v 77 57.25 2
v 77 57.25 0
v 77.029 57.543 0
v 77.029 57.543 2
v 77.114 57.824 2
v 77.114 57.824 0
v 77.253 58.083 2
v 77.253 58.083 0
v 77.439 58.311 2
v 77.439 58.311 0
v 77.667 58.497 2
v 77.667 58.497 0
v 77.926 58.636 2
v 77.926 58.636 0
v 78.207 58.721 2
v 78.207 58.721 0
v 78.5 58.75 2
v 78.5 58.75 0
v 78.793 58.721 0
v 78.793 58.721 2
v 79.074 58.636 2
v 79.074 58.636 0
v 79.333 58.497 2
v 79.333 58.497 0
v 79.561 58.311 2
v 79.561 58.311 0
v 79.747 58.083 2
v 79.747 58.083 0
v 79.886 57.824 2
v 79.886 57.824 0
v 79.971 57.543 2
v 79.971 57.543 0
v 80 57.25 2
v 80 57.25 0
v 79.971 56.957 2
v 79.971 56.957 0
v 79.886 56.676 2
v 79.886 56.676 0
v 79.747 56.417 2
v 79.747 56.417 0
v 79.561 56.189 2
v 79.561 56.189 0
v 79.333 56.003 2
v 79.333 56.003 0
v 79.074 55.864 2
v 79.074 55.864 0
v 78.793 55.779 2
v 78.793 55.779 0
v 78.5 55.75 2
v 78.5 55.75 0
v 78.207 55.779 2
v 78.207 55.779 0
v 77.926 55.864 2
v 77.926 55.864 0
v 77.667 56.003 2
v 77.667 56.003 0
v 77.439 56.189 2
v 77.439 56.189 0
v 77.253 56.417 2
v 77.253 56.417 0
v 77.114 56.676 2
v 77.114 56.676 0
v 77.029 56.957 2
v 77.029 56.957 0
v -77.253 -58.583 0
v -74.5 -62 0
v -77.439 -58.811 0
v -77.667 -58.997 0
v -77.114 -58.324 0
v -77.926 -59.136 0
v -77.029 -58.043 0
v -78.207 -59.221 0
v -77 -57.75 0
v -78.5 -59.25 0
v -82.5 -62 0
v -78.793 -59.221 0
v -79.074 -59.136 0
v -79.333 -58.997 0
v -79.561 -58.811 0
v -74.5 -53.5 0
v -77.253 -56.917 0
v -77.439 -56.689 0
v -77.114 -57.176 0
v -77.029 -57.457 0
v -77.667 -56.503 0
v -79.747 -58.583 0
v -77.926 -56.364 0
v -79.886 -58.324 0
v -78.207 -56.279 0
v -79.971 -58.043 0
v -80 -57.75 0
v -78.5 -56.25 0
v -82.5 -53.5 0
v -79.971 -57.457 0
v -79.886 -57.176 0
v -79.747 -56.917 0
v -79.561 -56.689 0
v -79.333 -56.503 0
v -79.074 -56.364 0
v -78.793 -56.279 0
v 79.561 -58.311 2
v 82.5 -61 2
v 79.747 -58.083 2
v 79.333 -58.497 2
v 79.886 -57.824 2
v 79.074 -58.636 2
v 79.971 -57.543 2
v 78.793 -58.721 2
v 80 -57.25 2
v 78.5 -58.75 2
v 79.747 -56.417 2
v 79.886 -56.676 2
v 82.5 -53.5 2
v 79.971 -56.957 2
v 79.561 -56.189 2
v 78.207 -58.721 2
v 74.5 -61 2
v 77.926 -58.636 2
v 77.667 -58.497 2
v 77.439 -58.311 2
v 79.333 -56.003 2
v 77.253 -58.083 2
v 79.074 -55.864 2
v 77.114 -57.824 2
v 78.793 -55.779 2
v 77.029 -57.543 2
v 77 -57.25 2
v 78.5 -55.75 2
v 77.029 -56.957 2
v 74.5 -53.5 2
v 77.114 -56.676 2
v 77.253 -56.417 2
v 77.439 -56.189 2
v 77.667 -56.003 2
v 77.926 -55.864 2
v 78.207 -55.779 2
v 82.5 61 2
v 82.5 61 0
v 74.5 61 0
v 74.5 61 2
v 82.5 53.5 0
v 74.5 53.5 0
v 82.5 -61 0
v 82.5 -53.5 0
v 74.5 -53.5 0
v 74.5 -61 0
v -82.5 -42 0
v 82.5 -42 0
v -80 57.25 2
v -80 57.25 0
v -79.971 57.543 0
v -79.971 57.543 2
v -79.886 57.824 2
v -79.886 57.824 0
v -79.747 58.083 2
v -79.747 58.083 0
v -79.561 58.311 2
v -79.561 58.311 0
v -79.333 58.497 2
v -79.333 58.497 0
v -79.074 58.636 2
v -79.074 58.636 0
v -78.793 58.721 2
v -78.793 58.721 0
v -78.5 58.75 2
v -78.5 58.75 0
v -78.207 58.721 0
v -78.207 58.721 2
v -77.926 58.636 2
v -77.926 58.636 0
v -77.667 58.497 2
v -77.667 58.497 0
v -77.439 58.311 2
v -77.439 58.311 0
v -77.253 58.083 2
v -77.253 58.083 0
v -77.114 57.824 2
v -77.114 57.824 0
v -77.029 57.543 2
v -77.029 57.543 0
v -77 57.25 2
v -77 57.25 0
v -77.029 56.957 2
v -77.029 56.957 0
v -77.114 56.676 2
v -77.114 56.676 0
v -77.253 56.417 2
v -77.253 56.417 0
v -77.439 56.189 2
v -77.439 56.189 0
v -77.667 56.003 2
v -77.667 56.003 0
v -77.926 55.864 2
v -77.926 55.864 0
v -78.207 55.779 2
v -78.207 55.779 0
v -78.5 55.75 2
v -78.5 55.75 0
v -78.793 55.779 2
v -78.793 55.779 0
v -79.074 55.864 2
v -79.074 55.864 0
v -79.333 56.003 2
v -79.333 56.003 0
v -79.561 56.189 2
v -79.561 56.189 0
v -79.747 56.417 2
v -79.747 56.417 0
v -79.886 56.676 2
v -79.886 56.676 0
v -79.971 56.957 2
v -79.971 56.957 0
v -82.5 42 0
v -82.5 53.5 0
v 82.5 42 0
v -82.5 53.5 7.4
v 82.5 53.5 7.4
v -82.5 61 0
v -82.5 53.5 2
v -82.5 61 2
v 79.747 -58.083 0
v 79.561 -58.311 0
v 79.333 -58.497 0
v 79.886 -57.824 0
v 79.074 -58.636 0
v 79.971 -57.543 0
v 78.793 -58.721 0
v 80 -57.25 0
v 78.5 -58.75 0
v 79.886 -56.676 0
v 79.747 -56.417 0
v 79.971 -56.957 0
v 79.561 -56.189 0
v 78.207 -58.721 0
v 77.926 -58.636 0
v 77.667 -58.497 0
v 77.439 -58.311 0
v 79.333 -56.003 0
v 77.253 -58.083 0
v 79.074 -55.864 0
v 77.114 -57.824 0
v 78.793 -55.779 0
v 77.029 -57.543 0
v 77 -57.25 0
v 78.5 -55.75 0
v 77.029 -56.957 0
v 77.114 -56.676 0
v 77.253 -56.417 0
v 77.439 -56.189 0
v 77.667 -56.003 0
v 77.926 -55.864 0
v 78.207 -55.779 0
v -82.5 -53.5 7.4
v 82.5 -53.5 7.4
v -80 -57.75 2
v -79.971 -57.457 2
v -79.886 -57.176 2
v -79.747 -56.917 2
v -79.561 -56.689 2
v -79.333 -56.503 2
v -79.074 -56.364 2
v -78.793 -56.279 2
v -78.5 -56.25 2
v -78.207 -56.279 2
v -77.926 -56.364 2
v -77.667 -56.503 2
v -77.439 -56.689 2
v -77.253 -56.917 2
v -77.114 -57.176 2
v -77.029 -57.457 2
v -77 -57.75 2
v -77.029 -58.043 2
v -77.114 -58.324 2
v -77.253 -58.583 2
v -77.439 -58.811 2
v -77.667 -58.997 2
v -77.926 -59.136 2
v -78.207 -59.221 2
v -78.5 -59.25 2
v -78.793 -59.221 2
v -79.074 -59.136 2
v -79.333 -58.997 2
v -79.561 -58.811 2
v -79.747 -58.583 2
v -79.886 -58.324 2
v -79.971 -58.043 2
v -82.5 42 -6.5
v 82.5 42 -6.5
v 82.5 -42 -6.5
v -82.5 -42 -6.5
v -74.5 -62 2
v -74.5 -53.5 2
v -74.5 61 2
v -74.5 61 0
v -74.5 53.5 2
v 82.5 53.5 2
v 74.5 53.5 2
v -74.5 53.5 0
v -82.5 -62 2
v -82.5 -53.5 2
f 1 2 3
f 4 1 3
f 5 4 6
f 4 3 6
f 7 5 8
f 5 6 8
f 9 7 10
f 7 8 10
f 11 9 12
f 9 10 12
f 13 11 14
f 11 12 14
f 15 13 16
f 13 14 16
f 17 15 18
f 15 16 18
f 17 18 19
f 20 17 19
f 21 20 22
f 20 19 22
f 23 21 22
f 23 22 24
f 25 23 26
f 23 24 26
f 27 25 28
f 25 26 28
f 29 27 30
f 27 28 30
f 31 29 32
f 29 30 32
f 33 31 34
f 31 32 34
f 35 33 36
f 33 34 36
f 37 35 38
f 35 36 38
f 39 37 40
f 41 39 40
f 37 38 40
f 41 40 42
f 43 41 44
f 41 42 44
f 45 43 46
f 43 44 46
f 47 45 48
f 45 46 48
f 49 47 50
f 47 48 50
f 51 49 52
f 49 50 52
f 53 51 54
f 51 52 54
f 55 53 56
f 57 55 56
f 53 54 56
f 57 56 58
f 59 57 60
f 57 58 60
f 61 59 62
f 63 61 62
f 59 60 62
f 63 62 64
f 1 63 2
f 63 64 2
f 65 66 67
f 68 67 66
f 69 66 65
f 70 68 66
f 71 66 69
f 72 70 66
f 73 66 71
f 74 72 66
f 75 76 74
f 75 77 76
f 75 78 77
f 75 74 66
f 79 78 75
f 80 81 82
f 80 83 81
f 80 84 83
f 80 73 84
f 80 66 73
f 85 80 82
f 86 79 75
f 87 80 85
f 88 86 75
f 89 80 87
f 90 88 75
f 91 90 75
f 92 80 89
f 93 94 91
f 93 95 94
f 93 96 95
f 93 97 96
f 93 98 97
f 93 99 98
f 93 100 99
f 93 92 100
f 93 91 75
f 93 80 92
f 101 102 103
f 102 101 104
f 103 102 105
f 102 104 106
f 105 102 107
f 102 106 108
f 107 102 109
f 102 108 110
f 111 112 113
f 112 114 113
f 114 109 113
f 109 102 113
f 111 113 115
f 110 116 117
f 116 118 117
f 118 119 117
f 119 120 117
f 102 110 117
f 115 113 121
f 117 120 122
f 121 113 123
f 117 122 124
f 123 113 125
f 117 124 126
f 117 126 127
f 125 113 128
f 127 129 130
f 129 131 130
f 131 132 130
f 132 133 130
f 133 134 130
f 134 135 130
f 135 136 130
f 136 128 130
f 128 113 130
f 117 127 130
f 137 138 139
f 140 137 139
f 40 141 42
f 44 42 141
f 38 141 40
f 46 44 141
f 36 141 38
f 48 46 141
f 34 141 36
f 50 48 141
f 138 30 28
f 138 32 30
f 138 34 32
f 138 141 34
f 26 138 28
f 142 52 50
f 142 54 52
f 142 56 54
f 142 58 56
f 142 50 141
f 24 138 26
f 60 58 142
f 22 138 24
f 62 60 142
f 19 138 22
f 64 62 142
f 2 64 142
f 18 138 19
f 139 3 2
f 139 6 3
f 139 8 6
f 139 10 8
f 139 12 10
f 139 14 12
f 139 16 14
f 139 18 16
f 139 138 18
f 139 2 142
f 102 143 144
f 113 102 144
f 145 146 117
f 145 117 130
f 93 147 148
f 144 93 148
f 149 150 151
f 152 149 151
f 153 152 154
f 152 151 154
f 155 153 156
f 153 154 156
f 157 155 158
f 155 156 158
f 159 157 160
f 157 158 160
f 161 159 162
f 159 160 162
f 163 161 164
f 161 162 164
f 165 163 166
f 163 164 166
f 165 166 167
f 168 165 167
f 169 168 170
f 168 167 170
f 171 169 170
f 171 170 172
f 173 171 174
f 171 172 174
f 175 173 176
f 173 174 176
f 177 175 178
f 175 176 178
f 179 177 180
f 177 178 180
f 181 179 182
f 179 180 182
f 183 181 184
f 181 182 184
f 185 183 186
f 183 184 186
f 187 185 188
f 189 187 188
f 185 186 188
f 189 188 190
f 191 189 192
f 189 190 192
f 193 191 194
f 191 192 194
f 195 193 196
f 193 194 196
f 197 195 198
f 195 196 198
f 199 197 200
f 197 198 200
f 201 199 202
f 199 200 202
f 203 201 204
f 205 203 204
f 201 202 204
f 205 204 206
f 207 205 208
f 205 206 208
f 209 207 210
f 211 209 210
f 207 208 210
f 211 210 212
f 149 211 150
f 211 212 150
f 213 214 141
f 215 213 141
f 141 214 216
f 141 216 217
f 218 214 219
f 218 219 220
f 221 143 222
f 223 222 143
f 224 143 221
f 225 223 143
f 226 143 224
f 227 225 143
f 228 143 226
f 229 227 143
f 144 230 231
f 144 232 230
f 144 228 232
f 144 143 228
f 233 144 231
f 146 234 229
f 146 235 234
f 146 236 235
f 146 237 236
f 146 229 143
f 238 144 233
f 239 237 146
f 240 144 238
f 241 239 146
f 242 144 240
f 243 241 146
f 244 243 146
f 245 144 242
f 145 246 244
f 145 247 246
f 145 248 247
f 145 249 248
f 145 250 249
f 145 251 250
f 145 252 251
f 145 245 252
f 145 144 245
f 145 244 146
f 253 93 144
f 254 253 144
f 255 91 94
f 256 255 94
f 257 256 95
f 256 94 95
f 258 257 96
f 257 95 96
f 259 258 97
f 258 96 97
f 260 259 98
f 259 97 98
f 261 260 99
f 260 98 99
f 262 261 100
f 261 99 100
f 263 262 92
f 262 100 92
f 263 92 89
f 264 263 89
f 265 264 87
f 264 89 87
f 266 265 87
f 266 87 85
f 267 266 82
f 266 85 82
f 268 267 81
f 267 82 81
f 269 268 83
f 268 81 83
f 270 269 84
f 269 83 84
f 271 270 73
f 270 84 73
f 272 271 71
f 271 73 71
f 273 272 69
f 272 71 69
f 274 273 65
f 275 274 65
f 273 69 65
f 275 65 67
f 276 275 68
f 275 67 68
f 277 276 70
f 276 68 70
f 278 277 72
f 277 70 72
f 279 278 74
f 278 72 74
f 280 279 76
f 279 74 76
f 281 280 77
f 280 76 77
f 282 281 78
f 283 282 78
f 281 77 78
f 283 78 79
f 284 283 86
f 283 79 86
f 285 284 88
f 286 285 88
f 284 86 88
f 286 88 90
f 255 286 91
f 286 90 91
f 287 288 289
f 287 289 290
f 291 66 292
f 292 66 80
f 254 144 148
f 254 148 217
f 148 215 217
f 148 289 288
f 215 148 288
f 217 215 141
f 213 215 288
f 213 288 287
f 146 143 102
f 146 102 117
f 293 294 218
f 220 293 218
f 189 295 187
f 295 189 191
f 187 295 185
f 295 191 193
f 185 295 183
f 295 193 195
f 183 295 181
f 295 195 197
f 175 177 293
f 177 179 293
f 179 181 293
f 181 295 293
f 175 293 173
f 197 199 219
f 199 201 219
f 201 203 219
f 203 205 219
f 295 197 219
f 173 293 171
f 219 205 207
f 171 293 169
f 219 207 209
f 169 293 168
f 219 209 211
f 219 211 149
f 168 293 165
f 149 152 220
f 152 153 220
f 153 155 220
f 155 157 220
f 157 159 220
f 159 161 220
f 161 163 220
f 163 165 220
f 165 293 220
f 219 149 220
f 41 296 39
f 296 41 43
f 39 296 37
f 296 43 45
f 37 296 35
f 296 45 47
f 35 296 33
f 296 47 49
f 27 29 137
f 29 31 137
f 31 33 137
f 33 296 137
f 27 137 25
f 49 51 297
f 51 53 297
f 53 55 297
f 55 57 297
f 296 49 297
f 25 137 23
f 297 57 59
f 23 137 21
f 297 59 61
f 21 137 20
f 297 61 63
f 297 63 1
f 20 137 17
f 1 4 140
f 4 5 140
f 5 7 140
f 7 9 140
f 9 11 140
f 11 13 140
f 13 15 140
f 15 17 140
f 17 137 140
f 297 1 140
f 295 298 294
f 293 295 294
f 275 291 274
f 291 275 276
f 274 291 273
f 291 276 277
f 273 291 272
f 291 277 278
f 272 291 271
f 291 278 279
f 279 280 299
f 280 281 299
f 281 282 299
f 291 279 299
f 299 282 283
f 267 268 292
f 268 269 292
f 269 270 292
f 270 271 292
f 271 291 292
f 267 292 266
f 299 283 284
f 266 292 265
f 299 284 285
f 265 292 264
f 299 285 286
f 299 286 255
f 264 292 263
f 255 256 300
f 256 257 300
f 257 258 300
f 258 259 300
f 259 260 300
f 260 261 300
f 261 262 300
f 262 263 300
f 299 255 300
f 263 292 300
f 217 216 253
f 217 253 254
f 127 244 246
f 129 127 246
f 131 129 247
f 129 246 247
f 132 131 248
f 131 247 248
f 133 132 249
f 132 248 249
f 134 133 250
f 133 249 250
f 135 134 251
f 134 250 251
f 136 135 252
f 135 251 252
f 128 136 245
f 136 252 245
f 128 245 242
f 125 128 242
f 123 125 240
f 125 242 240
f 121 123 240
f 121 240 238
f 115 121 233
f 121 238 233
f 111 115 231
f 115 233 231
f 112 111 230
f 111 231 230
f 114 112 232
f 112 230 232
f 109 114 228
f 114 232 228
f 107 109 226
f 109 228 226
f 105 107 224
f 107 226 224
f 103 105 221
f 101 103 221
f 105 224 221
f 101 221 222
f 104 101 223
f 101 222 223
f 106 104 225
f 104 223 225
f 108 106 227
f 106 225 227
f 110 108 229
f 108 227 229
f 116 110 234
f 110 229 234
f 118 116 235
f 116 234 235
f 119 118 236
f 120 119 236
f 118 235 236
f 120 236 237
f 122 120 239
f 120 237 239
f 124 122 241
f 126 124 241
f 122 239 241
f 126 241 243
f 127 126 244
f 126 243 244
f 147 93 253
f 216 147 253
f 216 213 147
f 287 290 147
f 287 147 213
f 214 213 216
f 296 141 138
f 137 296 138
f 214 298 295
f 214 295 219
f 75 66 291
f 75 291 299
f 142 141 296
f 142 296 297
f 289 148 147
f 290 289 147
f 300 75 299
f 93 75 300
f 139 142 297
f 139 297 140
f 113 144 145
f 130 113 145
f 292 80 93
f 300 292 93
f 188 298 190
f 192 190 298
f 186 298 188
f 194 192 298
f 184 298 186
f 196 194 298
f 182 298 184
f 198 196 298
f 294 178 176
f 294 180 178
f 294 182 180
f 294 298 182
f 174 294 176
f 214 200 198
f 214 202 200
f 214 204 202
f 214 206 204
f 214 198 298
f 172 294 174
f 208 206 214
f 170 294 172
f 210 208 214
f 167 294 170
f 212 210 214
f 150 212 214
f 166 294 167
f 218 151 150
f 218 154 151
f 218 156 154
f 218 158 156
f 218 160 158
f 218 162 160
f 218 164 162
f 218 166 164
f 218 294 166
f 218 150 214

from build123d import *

# Parameters (mm, degrees)
SKETCH1_W             = 165
SKETCH1_H             = 107
BOSS_EXTRUDE1_DEPTH   = 7.4
SKETCH2_W             = 8
SKETCH2_H             = 7.5
SKETCH2_R             = 1.5
BOSS_EXTRUDE2_DEPTH   = 2
BOSS_EXTRUDE2_2_DEPTH = 2
SKETCH2_H_2           = 8.5
BOSS_EXTRUDE2_3_DEPTH = 2
BOSS_EXTRUDE2_4_DEPTH = 2
SKETCH3_W             = 165
SKETCH3_H             = 84
BOSS_EXTRUDE3_DEPTH   = 6.5


with BuildPart() as part:
    # Sketch1 → Boss-Extrude1 (new body)
    with BuildSketch(Plane.XY):
        Rectangle(SKETCH1_W, SKETCH1_H)
    extrude(amount=BOSS_EXTRUDE1_DEPTH)

    # Sketch3 → Boss-Extrude3 (add)
    with BuildSketch(Plane(origin=(0, 0, 0), x_dir=(-1, 0, 0), z_dir=(0, 0, -1))):
        Rectangle(SKETCH3_W, SKETCH3_H)
    extrude(amount=BOSS_EXTRUDE3_DEPTH)


with BuildPart() as body_2:
    # Sketch2 → Boss-Extrude2 (new body)
    with BuildSketch(Plane(origin=(0, 0, 0), x_dir=(-1, 0, 0), z_dir=(0, 0, -1))):
        with Locations((-78.5, 57.25)):
            Rectangle(SKETCH2_W, SKETCH2_H)
        with Locations((-78.5, 57.25)):
            Circle(SKETCH2_R, mode=Mode.SUBTRACT)
    extrude(amount=-BOSS_EXTRUDE2_DEPTH)


with BuildPart() as body_3:
    # Sketch2 → Boss-Extrude2 2 (new body)
    with BuildSketch(Plane(origin=(0, 0, 0), x_dir=(-1, 0, 0), z_dir=(0, 0, -1))):
        with Locations((78.5, 57.25)):
            Rectangle(SKETCH2_W, SKETCH2_H)
        with Locations((78.5, 57.25)):
            Circle(SKETCH2_R, mode=Mode.SUBTRACT)
    extrude(amount=-BOSS_EXTRUDE2_2_DEPTH)


with BuildPart() as body_4:
    # Sketch2 → Boss-Extrude2 3 (new body)
    with BuildSketch(Plane(origin=(0, 0, 0), x_dir=(-1, 0, 0), z_dir=(0, 0, -1))):
        with Locations((78.5, -57.75)):
            Rectangle(SKETCH2_W, SKETCH2_H_2)
        with Locations((78.5, -57.75)):
            Circle(SKETCH2_R, mode=Mode.SUBTRACT)
    extrude(amount=-BOSS_EXTRUDE2_3_DEPTH)


with BuildPart() as body_5:
    # Sketch2 → Boss-Extrude2 4 (new body)
    with BuildSketch(Plane(origin=(0, 0, 0), x_dir=(-1, 0, 0), z_dir=(0, 0, -1))):
        with Locations((-78.5, -57.25)):
            Rectangle(SKETCH2_W, SKETCH2_H)
        with Locations((-78.5, -57.25)):
            Circle(SKETCH2_R, mode=Mode.SUBTRACT)
    extrude(amount=-BOSS_EXTRUDE2_4_DEPTH)


solid = Compound([part.part, body_2.part, body_3.part, body_4.part, body_5.part])
